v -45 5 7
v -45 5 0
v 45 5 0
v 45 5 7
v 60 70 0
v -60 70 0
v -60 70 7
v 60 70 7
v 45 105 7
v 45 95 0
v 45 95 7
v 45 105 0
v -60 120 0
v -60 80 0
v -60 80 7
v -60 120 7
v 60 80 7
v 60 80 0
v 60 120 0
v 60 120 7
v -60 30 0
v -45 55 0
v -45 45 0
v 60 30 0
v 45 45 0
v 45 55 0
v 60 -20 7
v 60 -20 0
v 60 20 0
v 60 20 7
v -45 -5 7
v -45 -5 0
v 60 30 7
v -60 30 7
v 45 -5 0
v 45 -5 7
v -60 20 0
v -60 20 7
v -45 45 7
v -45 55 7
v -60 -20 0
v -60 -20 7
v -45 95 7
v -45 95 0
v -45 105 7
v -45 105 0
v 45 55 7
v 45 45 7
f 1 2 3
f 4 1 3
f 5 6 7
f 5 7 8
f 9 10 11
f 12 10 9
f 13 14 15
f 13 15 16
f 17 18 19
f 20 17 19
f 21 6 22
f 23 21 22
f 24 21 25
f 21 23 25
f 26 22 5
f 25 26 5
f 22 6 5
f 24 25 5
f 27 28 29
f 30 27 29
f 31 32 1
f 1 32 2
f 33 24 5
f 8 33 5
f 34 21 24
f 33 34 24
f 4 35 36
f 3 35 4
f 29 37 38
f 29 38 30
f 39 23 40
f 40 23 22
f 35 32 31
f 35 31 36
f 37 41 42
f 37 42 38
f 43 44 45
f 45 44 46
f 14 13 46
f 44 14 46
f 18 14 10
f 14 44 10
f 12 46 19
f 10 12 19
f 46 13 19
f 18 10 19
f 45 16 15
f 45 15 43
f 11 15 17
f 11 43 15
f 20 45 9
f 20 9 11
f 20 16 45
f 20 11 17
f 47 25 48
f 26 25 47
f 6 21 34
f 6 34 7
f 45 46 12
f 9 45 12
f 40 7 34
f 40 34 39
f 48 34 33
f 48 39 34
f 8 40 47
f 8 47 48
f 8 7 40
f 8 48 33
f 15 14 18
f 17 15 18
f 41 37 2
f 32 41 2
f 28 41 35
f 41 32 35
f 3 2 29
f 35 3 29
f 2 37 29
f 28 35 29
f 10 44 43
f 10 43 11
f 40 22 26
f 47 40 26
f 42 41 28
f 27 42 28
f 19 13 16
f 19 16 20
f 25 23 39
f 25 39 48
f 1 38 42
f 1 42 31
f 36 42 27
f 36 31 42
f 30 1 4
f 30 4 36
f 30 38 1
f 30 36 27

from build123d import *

# Parameters (mm, degrees)
F0_W     = 120
F0_H     = 40
F0_W_2   = 90
F0_H_2   = 10
F1_DEPTH = 7


with BuildPart() as f1:
    # F0 (on Top) → F1 (new body)
    with BuildSketch(Plane.XY):
        Rectangle(F0_W, F0_H)
        Rectangle(F0_W_2, F0_H_2, mode=Mode.SUBTRACT)
    extrude(amount=F1_DEPTH)


with BuildPart() as f1b:
    # F0 (on Top) → F1, piece 2 (new body)
    with BuildSketch(Plane.XY):
        with Locations((0, 50)):
            Rectangle(F0_W, F0_H)
        with Locations((0, 50)):
            Rectangle(F0_W_2, F0_H_2, mode=Mode.SUBTRACT)
    extrude(amount=F1_DEPTH)


with BuildPart() as f1c:
    # F0 (on Top) → F1, piece 3 (new body)
    with BuildSketch(Plane.XY):
        with Locations((0, 100)):
            Rectangle(F0_W, F0_H)
        with Locations((0, 100)):
            Rectangle(F0_W_2, F0_H_2, mode=Mode.SUBTRACT)
    extrude(amount=F1_DEPTH)


with BuildPart() as f1d:
    # F0 (on Top) → F1, piece 4 (new body)
    with BuildSketch(Plane.XY):
        with Locations((130, 0)):
            Rectangle(F0_W, F0_H)
        with Locations((130, 0)):
            Rectangle(F0_W_2, F0_H_2, mode=Mode.SUBTRACT)
    extrude(amount=F1_DEPTH)


with BuildPart() as f1e:
    # F0 (on Top) → F1, piece 5 (new body)
    with BuildSketch(Plane.XY):
        with Locations((130, 50)):
            Rectangle(F0_W, F0_H)
        with Locations((130, 50)):
            Rectangle(F0_W_2, F0_H_2, mode=Mode.SUBTRACT)
    extrude(amount=F1_DEPTH)


with BuildPart() as f1f:
    # F0 (on Top) → F1, piece 6 (new body)
    with BuildSketch(Plane.XY):
        with Locations((130, 100)):
            Rectangle(F0_W, F0_H)
        with Locations((130, 100)):
            Rectangle(F0_W_2, F0_H_2, mode=Mode.SUBTRACT)
    extrude(amount=F1_DEPTH)


with BuildPart() as f2_1:
    # F2: copy of F1
    add(f1.part.moved(Location((0, 90, 0))))


with BuildPart() as f3_1:
    # F3: copy of F2_1
    add(f2_1.part.moved(Location((0, 90, 0))))


solid = Compound([f1.part, f1b.part, f1c.part])
